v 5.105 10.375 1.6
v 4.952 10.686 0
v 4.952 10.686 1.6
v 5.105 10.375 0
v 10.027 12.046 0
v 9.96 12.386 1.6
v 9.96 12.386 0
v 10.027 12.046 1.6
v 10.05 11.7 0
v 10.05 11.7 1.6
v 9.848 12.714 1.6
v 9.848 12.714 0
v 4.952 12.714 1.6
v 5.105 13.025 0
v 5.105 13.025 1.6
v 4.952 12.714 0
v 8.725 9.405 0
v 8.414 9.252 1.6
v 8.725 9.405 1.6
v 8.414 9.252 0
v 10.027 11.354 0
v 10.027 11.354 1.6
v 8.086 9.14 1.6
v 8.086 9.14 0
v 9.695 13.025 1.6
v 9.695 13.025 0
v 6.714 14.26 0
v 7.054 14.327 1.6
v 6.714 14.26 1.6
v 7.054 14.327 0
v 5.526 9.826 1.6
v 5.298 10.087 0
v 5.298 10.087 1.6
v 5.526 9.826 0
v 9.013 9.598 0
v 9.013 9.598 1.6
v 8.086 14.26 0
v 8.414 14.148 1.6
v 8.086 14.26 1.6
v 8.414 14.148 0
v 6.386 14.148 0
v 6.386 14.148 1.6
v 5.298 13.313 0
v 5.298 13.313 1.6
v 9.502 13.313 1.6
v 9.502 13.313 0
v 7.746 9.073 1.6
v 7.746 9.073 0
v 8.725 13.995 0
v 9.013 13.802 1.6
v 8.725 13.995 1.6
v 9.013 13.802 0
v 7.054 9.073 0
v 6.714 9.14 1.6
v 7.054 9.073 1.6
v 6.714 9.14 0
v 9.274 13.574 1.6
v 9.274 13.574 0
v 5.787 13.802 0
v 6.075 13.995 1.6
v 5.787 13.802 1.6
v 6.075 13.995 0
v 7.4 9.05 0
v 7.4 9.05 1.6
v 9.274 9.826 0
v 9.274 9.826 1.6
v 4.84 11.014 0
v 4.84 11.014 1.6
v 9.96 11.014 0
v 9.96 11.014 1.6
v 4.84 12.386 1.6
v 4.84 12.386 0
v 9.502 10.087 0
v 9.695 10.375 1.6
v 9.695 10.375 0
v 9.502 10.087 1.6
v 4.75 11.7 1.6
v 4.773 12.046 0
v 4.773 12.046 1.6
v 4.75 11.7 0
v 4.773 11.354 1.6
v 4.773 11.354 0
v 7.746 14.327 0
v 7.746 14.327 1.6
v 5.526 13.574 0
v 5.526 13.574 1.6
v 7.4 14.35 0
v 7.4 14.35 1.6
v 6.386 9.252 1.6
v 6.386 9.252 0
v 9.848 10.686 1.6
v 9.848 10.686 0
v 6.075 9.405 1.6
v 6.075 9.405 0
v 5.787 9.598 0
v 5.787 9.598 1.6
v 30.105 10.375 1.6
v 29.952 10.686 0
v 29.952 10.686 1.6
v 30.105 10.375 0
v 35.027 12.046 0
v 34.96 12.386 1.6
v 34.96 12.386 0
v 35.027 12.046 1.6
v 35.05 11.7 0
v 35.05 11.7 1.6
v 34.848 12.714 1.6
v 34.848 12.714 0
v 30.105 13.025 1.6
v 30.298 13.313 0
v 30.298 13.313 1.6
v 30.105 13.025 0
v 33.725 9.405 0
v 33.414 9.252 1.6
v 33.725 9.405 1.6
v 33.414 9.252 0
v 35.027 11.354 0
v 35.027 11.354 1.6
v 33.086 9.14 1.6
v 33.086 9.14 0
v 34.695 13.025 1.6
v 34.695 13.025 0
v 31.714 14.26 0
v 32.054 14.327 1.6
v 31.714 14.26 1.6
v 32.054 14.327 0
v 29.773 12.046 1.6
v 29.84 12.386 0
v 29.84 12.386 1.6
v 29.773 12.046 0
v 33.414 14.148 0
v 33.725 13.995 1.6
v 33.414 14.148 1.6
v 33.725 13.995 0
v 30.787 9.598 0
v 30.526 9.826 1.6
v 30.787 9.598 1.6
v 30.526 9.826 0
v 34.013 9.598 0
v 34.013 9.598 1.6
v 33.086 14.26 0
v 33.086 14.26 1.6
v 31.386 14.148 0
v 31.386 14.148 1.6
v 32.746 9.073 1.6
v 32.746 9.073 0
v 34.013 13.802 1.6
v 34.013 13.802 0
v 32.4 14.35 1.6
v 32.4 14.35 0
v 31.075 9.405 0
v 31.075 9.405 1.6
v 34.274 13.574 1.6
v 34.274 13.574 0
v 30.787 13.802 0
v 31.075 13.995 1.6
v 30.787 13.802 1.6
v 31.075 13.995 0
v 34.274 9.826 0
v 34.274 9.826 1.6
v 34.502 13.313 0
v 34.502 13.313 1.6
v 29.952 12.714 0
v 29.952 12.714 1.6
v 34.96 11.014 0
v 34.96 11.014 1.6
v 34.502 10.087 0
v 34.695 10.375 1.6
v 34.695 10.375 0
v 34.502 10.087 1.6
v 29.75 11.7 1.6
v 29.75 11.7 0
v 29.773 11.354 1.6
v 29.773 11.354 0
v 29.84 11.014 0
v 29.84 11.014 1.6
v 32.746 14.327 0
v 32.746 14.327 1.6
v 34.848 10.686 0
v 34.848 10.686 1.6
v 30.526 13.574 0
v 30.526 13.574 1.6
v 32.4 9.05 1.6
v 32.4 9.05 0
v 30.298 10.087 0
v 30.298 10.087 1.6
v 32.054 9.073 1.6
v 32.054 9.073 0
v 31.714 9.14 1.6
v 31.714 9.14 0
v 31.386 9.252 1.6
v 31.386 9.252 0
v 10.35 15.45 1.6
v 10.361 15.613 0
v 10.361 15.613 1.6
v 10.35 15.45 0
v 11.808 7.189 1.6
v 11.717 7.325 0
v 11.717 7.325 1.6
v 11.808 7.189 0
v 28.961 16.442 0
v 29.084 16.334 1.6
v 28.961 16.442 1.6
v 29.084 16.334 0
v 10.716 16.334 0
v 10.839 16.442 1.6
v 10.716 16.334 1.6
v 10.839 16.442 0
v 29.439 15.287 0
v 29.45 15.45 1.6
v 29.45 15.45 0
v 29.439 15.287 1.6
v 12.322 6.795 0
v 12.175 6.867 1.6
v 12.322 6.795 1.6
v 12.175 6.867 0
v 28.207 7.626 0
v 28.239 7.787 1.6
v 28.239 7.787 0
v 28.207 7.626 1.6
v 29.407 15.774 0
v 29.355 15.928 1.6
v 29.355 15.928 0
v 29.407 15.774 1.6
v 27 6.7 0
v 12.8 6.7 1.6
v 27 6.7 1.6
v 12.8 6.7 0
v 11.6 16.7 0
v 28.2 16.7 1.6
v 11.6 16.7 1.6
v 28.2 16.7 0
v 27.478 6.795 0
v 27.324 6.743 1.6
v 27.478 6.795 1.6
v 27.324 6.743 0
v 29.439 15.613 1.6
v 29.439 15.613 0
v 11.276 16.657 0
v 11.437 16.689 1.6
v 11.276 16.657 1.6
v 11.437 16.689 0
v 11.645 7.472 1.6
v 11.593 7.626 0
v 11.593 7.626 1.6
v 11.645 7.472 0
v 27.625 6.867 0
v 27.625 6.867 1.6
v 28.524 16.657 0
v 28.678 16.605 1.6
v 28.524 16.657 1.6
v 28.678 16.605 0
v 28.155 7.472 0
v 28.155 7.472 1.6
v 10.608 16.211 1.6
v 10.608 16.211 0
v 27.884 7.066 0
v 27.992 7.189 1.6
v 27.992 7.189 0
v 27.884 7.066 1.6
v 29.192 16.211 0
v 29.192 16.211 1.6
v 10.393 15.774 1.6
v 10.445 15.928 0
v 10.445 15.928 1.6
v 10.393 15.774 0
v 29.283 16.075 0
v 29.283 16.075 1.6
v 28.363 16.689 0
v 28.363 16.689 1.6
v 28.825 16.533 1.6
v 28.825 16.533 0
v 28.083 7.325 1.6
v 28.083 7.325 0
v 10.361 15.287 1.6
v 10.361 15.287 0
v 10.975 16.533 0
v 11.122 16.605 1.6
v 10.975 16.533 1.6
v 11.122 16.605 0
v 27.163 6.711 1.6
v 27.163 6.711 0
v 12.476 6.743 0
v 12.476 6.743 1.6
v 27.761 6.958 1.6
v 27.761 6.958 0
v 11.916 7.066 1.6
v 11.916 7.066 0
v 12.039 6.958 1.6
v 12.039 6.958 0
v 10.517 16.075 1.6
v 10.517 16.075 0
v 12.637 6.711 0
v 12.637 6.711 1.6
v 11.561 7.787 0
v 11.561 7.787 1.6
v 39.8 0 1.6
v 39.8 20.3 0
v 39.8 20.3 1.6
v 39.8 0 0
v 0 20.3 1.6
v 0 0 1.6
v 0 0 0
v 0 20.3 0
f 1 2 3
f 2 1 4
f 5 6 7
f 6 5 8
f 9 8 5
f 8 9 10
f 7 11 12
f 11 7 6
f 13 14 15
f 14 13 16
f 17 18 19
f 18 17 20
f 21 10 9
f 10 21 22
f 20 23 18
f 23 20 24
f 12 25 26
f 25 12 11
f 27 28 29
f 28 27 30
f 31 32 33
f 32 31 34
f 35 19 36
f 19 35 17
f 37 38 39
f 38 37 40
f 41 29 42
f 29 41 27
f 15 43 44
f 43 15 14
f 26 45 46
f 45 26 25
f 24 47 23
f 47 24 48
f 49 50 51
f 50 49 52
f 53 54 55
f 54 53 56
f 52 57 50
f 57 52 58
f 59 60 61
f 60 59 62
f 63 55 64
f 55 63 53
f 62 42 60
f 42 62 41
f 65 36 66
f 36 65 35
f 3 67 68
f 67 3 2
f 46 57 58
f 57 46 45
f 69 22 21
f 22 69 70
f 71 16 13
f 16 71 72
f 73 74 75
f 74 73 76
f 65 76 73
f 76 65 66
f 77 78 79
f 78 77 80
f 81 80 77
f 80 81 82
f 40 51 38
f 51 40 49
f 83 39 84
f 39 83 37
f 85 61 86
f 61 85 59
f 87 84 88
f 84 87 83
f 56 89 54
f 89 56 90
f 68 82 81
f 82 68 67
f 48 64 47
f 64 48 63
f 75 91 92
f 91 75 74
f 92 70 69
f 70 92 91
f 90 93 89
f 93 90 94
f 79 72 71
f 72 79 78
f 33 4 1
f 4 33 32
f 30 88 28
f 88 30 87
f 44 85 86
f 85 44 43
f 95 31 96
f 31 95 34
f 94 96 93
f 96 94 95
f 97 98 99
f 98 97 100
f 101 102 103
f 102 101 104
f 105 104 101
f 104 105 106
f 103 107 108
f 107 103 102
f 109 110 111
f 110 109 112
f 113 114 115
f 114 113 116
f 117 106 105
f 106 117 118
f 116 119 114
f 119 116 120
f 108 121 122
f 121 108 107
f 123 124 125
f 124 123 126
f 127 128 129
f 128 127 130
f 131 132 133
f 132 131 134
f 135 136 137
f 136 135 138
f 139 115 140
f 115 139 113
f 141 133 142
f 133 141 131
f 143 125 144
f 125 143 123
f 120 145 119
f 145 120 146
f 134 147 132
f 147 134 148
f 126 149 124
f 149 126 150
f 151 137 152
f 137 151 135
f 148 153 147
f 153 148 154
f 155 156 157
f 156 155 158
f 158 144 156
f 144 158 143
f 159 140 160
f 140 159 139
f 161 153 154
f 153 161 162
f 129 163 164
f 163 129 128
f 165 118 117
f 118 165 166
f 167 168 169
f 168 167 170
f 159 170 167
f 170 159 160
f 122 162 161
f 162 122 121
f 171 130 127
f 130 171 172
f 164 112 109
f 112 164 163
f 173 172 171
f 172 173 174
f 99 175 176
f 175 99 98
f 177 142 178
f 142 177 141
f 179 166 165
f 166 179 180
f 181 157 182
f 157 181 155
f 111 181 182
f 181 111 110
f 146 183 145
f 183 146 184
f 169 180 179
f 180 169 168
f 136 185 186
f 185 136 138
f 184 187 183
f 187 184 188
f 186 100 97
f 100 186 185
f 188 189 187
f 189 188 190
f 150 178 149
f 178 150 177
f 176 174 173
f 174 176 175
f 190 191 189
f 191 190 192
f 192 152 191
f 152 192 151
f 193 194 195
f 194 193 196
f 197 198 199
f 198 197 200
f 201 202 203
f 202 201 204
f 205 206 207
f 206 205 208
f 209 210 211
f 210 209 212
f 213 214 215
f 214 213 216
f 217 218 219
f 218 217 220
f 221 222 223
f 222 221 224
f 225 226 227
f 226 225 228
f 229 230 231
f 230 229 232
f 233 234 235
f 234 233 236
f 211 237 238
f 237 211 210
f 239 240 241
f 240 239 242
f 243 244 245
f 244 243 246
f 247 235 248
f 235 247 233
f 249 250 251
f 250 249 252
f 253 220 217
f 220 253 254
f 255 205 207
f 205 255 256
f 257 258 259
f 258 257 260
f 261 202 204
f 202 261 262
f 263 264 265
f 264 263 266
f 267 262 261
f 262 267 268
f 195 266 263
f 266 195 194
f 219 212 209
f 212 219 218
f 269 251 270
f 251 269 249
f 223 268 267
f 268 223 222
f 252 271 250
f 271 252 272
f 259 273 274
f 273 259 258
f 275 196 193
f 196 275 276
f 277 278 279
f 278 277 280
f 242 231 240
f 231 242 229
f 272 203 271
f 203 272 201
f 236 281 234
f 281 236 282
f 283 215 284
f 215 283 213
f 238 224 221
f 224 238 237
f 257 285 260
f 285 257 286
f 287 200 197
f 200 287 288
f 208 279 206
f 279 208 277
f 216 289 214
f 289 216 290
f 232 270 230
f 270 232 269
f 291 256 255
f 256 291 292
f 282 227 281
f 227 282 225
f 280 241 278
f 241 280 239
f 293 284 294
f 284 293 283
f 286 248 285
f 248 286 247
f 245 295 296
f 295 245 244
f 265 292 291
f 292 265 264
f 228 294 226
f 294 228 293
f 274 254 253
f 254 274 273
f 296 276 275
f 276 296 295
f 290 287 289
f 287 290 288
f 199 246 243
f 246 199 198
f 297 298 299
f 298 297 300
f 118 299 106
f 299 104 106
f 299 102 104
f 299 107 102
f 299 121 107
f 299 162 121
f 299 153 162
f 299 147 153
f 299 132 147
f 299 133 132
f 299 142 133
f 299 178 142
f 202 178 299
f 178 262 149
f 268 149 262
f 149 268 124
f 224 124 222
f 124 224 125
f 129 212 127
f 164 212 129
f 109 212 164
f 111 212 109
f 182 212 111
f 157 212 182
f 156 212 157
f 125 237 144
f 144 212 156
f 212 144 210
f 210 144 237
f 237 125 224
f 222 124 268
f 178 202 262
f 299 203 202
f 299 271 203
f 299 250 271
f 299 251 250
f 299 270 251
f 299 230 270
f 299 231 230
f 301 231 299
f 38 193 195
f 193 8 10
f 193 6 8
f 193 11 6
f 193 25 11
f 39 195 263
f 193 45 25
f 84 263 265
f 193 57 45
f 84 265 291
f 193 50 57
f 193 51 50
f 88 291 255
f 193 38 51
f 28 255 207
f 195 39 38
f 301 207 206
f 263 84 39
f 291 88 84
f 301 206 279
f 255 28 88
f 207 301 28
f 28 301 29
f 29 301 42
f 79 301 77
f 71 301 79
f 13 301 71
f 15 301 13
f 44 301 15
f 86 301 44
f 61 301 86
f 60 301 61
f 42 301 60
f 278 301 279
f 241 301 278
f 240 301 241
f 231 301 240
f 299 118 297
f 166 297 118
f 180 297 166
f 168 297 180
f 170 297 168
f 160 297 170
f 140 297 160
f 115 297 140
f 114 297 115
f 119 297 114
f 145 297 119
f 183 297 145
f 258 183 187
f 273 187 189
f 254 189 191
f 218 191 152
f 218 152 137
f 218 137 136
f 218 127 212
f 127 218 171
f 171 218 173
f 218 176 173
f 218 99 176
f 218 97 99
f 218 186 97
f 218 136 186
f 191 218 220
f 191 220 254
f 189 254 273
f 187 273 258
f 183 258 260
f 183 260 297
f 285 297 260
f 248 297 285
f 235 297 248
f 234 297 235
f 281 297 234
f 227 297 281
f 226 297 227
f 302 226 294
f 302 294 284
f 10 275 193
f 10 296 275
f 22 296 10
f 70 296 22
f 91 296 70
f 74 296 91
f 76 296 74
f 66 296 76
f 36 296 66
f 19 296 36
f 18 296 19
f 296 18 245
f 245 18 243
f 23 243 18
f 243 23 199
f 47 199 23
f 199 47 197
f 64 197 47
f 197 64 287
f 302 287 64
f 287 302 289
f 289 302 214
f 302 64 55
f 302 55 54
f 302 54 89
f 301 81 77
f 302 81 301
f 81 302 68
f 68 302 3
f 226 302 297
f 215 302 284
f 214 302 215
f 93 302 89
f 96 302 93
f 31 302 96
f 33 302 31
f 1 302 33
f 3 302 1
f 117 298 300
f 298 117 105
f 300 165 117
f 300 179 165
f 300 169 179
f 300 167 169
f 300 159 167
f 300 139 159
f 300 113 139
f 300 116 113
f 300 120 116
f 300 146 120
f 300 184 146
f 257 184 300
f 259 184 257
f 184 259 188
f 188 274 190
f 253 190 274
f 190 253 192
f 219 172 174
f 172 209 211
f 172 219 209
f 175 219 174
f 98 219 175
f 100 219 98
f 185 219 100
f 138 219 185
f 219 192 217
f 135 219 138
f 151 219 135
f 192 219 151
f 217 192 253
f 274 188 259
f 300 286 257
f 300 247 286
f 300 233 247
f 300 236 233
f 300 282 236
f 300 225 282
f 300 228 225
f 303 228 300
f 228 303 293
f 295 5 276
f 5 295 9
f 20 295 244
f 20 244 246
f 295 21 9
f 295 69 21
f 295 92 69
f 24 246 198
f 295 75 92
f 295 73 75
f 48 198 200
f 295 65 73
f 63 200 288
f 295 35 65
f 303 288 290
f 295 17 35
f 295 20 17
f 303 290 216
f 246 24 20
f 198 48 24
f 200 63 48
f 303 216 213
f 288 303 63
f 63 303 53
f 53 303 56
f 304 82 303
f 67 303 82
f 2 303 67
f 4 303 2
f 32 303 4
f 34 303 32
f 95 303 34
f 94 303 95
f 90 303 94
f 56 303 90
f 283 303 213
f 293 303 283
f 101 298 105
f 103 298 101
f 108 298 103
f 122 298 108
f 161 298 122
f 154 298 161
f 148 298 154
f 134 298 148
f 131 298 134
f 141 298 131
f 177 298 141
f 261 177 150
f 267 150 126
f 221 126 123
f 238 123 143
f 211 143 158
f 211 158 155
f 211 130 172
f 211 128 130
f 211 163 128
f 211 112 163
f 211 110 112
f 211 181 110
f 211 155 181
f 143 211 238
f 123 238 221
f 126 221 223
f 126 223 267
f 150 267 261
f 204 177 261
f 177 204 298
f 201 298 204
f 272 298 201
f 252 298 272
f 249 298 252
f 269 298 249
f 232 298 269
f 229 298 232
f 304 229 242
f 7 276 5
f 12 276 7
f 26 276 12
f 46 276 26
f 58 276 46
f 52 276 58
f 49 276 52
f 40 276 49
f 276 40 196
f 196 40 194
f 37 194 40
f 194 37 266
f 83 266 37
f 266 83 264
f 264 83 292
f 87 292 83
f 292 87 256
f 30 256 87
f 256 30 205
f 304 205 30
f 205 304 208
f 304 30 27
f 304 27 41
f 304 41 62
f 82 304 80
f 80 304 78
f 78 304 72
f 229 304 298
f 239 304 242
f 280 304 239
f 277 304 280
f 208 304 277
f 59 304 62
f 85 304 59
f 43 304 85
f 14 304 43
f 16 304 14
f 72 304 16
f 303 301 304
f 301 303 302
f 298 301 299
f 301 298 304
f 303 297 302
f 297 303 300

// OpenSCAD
// file: lid-lib.scad
module rounded_db9_face(
    wide_width,
    narrow_width,
    height,
    radius,
    fn = 48
) {
    hull() {
        for (point = [
            [-narrow_width / 2 + radius, -height / 2 + radius],
            [ narrow_width / 2 - radius, -height / 2 + radius],
            [-wide_width / 2 + radius, height / 2 - radius],
            [ wide_width / 2 - radius, height / 2 - radius]
        ])
            translate(point)
                circle(r = radius, $fn = fn);
    }
}

module db9_pattern(
    center,
    face_wide_width,
    face_narrow_width,
    face_height,
    face_radius,
    screw_spacing,
    screw_diameter,
    clearance,
    extrusion_height,
    fn = 48
) {
    translate([center[0], center[1], 0]) {
        linear_extrude(height = extrusion_height)
            rounded_db9_face(
                face_wide_width + 2 * clearance,
                face_narrow_width + 2 * clearance,
                face_height + 2 * clearance,
                face_radius + clearance,
                fn
            );

        for (x = [-screw_spacing / 2, screw_spacing / 2])
            translate([x, 0, 0])
                cylinder(
                    h = extrusion_height,
                    d = screw_diameter + 2 * clearance,
                    $fn = fn
                );
    }
}

module lid(
    size,
    thickness,
    db9_center,
    face_wide_width,
    face_narrow_width,
    face_height,
    face_radius,
    screw_spacing,
    screw_diameter,
    clearance,
    epsilon = 0.01
) {
    difference() {
        cube([size[0], size[1], thickness]);
        translate([0, 0, -epsilon])
            db9_pattern(
                db9_center,
                face_wide_width,
                face_narrow_width,
                face_height,
                face_radius,
                screw_spacing,
                screw_diameter,
                clearance,
                thickness + 2 * epsilon
            );
    }
}
// file: dimensions.scad
// Shared dimensions for the case, lid, and assembly preview.

// PCB dimensions.
pcb_length = 65; // USB edge to DB9 edge; confirmed
pcb_width = 35;  // confirmed
pcb_thickness = 1.6;
width_clearance = 0.8;

// Cross-section viewed from the USB end.
underboard_clearance = 2;
component_height = 13; // estimated PCB top to tallest component
component_clearance = 0.5;

// Case dimensions. A 1.6 mm wall is four lines with a 0.4 mm nozzle.
wall = 1.6;
bottom_thickness = 1.6;
top_clearance = 0.5;

// Distance the USB-B shell extends beyond the PCB edge.
usb_projection = 6.5;

// USB-B opening in the closed bottom, viewed from the connector end.
usb_opening_width = 13.5;
usb_opening_depth = 12.5;
usb_opening_below_pcb_top = 0.5;

// Side ribs overlap only this much of each PCB edge.
guide_contact_width = 0.8;

// Flat DB9-end lid. Measurements are derived from the straight-on product
// photo and the connector's 25 mm screw spacing; verify after a fit test.
lid_thickness = 1.6;
db9_face_wide_width = 18.6;
db9_face_narrow_width = 16.2;
db9_face_height = 9.5;
db9_face_corner_radius = 1;
db9_screw_spacing = 25;
db9_screw_boss_diameter = 4.8;
db9_fit_clearance = 0.25;
db9_center_above_pcb_top = 6.5;

epsilon = 0.01;

inner_width = pcb_width + 2 * width_clearance;
inner_depth = underboard_clearance
    + pcb_thickness
    + component_height
    + component_clearance;
outer_width = inner_width + 2 * wall;
outer_depth = inner_depth + 2 * wall;
case_height = usb_projection + pcb_length + top_clearance;

pcb_x = wall + width_clearance;
pcb_y = wall + underboard_clearance;
pcb_top_y = pcb_y + pcb_thickness;

db9_center_x = outer_width / 2;
db9_center_y = pcb_top_y + db9_center_above_pcb_top;
// main file
// Flat DB9-end lid, oriented face-down for printing.

include <dimensions.scad>
use <lid-lib.scad>

lid(
    [outer_width, outer_depth],
    lid_thickness,
    [db9_center_x, db9_center_y],
    db9_face_wide_width,
    db9_face_narrow_width,
    db9_face_height,
    db9_face_corner_radius,
    db9_screw_spacing,
    db9_screw_boss_diameter,
    db9_fit_clearance,
    epsilon
);
